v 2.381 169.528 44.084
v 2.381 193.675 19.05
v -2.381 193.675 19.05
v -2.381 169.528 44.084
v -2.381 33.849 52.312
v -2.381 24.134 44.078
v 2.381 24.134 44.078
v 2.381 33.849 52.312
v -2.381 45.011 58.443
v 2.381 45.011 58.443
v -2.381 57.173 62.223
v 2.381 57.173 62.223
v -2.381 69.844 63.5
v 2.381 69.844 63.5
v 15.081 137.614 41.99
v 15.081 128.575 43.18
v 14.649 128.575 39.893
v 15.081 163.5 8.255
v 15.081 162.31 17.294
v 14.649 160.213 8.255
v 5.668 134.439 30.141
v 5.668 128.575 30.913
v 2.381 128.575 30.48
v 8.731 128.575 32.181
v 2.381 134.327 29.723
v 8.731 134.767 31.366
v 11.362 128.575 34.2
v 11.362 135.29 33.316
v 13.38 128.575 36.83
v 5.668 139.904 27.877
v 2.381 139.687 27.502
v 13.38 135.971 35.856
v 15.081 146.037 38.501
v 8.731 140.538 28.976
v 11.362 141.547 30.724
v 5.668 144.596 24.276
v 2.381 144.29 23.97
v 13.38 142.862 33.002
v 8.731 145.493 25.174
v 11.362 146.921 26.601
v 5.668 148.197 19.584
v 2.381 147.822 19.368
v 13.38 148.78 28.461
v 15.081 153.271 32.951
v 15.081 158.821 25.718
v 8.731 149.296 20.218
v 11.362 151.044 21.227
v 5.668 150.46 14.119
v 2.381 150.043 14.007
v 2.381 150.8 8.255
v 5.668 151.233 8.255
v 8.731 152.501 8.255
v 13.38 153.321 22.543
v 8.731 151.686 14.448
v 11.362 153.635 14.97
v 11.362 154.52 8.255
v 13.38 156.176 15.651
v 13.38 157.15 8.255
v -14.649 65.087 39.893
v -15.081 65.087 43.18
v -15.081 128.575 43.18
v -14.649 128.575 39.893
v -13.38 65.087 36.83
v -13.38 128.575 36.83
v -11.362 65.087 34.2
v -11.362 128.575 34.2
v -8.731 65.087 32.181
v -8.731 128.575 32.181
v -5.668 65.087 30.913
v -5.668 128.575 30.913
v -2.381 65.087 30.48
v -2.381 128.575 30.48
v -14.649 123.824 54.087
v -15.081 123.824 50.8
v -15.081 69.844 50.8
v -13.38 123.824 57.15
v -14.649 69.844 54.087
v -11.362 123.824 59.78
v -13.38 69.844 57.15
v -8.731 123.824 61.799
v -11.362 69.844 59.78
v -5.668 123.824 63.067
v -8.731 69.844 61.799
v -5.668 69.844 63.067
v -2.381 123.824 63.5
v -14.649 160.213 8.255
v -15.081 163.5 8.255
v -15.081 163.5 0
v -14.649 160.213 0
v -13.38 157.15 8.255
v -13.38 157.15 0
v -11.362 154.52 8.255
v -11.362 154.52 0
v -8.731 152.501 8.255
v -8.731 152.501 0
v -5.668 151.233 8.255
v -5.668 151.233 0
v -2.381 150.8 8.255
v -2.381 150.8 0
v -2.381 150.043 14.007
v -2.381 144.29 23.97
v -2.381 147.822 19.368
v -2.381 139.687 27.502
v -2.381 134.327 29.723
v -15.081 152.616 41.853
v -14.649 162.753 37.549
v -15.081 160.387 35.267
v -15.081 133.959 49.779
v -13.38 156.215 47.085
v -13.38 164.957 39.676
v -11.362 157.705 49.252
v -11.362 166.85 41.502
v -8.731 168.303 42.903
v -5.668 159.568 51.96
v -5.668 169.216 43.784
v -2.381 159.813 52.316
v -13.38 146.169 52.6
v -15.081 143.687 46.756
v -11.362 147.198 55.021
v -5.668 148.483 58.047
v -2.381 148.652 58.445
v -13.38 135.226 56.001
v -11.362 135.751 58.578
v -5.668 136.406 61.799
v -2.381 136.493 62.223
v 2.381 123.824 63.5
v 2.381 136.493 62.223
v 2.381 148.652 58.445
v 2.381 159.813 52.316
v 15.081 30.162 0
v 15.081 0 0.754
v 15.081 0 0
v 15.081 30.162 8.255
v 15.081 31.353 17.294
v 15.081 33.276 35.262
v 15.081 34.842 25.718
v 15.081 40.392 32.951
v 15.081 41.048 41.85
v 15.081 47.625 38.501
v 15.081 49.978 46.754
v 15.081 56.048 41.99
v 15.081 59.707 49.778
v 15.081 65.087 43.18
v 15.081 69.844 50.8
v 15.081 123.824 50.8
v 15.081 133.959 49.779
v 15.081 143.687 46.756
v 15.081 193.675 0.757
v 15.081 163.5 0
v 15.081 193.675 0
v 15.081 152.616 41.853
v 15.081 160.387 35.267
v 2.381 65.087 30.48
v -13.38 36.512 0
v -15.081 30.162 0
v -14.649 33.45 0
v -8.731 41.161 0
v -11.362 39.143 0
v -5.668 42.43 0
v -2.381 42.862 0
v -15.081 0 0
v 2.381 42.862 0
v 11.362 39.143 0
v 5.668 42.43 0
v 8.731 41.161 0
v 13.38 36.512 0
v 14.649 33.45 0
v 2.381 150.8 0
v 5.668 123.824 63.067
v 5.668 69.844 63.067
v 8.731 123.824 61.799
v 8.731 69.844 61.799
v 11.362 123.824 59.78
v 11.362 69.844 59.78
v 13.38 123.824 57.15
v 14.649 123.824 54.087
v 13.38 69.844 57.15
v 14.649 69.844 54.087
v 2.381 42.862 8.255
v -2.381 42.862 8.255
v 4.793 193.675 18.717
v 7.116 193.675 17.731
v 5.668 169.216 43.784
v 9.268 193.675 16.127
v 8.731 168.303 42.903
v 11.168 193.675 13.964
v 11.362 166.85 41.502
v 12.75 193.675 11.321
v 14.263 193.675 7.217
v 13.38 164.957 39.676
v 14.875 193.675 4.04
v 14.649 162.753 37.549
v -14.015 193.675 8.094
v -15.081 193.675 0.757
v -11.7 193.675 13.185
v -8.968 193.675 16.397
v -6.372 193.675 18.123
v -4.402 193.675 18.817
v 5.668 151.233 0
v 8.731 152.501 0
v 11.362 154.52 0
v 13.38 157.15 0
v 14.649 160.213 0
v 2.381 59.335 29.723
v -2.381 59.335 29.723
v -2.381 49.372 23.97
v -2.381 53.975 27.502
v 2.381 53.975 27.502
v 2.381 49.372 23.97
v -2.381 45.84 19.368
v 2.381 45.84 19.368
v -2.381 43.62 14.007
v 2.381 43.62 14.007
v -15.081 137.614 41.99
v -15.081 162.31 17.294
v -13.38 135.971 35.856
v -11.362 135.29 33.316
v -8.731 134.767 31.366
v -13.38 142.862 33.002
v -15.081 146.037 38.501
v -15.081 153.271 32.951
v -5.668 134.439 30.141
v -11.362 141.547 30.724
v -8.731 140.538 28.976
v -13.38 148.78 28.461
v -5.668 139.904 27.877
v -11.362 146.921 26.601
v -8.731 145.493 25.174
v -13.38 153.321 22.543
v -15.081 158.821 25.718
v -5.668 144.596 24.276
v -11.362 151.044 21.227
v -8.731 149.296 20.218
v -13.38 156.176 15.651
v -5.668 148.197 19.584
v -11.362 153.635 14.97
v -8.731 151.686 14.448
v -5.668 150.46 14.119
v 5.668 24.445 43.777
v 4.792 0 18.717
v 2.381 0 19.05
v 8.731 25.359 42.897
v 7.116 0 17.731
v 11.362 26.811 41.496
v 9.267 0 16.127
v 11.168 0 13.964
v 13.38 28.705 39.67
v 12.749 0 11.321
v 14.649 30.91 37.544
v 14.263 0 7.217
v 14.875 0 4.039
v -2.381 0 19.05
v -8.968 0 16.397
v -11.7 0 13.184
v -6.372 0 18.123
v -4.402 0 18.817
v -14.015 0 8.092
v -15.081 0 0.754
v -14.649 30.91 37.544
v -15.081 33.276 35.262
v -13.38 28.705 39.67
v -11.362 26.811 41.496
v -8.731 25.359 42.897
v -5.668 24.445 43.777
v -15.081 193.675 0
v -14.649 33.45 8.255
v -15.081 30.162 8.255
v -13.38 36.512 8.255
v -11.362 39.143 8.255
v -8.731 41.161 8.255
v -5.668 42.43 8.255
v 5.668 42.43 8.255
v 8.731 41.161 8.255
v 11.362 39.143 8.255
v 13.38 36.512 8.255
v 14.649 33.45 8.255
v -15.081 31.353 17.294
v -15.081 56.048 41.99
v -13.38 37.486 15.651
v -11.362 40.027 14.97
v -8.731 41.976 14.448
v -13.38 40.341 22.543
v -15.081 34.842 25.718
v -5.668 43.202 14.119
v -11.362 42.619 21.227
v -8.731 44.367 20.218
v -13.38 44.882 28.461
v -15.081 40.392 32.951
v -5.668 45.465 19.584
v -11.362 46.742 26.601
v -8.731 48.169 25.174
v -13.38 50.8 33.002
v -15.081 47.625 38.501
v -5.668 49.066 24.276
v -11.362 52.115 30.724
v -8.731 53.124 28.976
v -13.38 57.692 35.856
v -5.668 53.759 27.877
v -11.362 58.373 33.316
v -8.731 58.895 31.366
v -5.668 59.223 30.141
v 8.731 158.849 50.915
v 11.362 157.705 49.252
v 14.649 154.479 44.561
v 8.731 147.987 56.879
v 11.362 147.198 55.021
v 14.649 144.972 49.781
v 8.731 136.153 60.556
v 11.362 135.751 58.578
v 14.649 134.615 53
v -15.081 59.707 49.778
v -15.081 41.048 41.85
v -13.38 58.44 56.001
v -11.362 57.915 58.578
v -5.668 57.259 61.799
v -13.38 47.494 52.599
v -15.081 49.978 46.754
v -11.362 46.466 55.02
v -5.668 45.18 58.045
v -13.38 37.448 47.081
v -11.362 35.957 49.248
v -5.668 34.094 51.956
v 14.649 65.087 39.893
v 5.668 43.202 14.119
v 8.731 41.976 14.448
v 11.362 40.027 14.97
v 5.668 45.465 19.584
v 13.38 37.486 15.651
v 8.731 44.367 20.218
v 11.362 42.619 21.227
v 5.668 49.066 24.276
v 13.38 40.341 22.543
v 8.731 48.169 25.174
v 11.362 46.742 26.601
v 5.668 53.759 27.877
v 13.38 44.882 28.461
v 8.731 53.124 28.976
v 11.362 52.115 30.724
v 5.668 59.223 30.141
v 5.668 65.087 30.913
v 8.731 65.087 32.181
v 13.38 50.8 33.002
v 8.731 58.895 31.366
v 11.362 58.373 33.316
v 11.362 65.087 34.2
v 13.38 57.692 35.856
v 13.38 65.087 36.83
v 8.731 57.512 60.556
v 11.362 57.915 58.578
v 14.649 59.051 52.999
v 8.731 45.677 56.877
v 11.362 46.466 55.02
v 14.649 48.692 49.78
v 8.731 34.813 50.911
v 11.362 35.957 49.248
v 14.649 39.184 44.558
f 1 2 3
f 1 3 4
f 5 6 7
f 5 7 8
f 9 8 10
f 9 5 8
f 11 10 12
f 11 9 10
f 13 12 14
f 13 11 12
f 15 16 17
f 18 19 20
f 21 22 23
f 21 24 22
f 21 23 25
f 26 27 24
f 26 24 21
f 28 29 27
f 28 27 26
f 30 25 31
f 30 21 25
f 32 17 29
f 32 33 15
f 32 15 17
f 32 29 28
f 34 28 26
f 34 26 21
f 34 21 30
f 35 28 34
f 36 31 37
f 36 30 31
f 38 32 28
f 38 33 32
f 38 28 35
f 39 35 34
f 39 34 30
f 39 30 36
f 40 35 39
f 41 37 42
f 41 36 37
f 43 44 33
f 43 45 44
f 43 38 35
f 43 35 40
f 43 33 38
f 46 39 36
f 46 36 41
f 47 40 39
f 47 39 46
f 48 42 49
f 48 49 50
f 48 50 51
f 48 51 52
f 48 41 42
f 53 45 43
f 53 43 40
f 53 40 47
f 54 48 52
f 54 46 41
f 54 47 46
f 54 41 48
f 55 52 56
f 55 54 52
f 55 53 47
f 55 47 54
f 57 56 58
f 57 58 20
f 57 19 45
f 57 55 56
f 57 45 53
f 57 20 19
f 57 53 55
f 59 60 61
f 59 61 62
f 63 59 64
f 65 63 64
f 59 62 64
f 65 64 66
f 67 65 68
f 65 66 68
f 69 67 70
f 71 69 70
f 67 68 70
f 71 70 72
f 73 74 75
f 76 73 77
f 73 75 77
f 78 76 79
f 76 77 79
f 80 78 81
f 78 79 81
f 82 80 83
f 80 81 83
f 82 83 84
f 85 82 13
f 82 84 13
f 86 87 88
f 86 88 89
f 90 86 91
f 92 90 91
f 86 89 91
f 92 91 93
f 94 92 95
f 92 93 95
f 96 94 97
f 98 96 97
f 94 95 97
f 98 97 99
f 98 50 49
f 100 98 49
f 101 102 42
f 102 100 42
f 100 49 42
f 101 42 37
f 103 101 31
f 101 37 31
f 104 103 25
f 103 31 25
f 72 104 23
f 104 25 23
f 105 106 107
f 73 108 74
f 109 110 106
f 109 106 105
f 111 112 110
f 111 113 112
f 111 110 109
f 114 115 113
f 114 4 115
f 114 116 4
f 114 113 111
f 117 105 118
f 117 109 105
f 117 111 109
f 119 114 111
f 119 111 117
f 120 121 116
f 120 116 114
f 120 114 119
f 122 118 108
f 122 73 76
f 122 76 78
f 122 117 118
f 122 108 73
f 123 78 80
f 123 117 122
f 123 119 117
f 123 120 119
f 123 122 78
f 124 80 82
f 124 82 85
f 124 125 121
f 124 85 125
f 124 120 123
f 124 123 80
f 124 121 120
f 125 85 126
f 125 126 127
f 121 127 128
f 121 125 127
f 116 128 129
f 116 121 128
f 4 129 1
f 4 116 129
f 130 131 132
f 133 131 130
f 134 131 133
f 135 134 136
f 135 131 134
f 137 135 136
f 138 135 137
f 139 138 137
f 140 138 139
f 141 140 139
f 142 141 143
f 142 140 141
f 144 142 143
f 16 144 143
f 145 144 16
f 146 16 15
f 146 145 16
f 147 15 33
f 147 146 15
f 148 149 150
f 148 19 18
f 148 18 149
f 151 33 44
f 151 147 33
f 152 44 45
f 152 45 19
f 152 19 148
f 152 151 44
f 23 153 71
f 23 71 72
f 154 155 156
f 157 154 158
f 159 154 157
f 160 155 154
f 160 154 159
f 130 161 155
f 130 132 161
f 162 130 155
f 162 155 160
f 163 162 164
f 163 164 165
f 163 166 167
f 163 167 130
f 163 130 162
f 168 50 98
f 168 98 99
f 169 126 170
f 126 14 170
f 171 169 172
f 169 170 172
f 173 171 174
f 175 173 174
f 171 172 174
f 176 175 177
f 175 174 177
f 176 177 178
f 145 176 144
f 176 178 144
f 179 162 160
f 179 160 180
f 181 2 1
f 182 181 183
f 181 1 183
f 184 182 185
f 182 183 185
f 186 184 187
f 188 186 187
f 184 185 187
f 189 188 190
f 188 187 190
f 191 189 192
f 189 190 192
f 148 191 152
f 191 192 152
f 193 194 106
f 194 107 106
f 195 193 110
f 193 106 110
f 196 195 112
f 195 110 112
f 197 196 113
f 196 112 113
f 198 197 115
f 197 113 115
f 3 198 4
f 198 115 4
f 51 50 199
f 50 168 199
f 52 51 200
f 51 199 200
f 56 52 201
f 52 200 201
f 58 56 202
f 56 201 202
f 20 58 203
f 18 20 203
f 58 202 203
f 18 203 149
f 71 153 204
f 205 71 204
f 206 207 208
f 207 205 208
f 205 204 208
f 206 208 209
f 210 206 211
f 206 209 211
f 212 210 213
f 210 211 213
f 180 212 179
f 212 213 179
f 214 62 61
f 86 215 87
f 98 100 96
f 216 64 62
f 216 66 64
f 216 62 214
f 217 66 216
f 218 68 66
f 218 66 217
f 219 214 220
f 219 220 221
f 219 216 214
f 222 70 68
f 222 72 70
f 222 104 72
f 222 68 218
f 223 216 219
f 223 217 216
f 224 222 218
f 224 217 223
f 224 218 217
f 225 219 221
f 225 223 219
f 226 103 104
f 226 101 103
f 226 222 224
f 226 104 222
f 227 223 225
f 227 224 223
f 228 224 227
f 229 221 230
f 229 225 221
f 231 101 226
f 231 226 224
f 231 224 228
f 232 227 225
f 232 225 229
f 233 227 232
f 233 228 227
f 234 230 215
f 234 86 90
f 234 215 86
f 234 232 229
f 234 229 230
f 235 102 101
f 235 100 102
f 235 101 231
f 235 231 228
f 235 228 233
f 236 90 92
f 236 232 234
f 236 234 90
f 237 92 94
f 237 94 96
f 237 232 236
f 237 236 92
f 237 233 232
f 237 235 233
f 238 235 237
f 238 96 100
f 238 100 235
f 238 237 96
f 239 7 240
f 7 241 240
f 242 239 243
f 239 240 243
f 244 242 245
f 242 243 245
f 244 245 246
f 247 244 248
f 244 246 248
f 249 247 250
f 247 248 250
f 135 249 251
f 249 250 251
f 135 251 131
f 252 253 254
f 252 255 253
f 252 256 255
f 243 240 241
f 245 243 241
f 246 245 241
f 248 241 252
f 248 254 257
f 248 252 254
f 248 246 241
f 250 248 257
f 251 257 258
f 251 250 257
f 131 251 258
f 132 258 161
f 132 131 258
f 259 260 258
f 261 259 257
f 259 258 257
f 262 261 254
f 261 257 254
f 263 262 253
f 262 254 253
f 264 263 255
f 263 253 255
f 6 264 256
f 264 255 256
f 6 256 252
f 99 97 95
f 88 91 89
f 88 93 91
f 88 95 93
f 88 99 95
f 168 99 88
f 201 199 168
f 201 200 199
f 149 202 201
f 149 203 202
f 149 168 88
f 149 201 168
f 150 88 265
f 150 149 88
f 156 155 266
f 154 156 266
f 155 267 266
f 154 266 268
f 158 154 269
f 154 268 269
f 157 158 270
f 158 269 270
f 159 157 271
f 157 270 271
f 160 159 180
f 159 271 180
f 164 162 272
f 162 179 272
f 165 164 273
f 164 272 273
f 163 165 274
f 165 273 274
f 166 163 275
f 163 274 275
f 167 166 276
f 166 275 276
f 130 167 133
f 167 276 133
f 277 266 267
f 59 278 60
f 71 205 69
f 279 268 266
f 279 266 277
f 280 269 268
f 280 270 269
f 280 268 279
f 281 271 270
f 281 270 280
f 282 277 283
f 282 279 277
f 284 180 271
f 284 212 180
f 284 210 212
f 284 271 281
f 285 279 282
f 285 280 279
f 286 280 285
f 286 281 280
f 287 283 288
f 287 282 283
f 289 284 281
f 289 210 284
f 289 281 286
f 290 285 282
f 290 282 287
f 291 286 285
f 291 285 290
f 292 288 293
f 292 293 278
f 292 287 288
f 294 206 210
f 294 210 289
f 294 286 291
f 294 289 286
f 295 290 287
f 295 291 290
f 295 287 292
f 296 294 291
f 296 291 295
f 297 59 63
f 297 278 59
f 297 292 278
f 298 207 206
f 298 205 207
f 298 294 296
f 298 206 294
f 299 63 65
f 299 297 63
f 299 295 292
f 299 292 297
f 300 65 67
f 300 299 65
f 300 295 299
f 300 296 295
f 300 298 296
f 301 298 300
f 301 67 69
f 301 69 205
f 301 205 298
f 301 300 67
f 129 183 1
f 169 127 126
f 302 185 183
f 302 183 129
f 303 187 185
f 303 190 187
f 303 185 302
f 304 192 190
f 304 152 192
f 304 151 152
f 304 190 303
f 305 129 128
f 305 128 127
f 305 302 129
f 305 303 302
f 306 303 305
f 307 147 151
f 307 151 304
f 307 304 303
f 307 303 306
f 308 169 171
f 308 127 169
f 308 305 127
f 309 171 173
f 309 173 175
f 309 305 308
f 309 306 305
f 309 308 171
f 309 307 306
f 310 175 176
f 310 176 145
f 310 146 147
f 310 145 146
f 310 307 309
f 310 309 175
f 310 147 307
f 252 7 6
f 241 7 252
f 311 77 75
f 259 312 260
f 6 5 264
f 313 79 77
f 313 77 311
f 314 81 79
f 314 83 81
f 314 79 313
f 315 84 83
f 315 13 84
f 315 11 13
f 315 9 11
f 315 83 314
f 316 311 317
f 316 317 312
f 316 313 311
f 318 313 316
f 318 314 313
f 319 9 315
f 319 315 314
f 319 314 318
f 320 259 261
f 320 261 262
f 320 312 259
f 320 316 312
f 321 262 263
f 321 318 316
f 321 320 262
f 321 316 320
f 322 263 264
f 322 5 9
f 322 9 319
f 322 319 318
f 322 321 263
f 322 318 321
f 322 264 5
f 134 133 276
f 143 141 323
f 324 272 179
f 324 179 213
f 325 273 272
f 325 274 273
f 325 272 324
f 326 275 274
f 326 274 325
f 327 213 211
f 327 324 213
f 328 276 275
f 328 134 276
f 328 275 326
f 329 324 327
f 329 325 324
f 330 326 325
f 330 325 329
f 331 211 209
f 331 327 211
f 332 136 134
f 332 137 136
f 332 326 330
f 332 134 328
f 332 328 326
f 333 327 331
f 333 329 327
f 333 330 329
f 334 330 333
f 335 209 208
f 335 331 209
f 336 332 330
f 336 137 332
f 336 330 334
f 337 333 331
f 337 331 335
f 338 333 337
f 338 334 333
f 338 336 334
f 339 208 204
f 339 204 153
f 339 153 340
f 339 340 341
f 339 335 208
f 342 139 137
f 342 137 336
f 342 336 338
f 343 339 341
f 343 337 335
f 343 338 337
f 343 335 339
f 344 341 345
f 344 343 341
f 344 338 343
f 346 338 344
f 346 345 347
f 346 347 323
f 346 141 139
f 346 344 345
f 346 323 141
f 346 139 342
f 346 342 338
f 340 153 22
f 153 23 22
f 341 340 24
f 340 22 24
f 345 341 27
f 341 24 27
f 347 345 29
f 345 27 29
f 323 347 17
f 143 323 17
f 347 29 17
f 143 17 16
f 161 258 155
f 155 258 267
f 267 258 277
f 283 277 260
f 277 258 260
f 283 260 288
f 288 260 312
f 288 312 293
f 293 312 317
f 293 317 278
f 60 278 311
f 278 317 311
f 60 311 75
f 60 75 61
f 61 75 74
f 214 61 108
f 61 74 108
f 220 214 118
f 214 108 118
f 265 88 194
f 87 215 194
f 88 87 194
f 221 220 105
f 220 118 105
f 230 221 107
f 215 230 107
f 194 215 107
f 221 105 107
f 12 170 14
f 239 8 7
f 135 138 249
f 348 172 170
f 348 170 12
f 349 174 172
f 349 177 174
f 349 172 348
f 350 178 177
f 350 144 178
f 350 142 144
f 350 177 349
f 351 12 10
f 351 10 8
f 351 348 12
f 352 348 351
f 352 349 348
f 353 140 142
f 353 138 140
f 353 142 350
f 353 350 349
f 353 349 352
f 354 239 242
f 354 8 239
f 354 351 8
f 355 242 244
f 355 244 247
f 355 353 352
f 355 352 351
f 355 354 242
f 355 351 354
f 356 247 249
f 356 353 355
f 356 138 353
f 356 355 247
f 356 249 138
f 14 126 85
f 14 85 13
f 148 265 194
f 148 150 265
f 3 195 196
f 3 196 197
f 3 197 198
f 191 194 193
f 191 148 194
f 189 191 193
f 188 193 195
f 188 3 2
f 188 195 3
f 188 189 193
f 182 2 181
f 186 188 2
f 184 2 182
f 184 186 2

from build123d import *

# Parameters (mm, degrees)
F1_DEPTH      = 15.08125
F1_DEPTH_BACK = 15.08125
F2_R          = 63.5
F3_R          = 22.225
F4_R          = 12.7


with BuildPart() as f1:
    # F0 (on Right) → F1 (new body, two sides)
    with BuildSketch(Plane.YZ) as f1_sk:
        Polygon((0, 19.05), (0, 0), (42.8625, 0), (42.8625, 30.48), (96.8375, 30.48), (150.7998, 30.48), (150.7998, 0), (193.675, 0), (193.675, 19.05), (150.7998, 63.5), (42.8625, 63.5), align=None)
    extrude(amount=F1_DEPTH)
    extrude(f1_sk.sketch, amount=-F1_DEPTH_BACK)

    # F2
    f2_edges = [f1.edges().sort_by_distance(p)[0] for p in [
        (0, 42.8625, 63.5),
        (0, 150.7998, 63.5),
    ]]
    fillet(f2_edges, radius=F2_R)

    # F3
    f3_edges = [f1.edges().sort_by_distance(p)[0] for p in [
        (0, 42.8625, 30.48),
        (0, 150.7998, 30.48),
    ]]
    fillet(f3_edges, radius=F3_R)

    # F4
    f4_edges = [f1.edges().sort_by_distance(p)[0] for p in [
        (15.08125, 96.83115, 30.48),
        (-15.08125, 96.83115, 30.48),
        (-15.08125, 96.833924, 63.5),
        (15.08125, 96.833924, 63.5),
    ]]
    fillet(f4_edges, radius=F4_R)


solid = f1.part
